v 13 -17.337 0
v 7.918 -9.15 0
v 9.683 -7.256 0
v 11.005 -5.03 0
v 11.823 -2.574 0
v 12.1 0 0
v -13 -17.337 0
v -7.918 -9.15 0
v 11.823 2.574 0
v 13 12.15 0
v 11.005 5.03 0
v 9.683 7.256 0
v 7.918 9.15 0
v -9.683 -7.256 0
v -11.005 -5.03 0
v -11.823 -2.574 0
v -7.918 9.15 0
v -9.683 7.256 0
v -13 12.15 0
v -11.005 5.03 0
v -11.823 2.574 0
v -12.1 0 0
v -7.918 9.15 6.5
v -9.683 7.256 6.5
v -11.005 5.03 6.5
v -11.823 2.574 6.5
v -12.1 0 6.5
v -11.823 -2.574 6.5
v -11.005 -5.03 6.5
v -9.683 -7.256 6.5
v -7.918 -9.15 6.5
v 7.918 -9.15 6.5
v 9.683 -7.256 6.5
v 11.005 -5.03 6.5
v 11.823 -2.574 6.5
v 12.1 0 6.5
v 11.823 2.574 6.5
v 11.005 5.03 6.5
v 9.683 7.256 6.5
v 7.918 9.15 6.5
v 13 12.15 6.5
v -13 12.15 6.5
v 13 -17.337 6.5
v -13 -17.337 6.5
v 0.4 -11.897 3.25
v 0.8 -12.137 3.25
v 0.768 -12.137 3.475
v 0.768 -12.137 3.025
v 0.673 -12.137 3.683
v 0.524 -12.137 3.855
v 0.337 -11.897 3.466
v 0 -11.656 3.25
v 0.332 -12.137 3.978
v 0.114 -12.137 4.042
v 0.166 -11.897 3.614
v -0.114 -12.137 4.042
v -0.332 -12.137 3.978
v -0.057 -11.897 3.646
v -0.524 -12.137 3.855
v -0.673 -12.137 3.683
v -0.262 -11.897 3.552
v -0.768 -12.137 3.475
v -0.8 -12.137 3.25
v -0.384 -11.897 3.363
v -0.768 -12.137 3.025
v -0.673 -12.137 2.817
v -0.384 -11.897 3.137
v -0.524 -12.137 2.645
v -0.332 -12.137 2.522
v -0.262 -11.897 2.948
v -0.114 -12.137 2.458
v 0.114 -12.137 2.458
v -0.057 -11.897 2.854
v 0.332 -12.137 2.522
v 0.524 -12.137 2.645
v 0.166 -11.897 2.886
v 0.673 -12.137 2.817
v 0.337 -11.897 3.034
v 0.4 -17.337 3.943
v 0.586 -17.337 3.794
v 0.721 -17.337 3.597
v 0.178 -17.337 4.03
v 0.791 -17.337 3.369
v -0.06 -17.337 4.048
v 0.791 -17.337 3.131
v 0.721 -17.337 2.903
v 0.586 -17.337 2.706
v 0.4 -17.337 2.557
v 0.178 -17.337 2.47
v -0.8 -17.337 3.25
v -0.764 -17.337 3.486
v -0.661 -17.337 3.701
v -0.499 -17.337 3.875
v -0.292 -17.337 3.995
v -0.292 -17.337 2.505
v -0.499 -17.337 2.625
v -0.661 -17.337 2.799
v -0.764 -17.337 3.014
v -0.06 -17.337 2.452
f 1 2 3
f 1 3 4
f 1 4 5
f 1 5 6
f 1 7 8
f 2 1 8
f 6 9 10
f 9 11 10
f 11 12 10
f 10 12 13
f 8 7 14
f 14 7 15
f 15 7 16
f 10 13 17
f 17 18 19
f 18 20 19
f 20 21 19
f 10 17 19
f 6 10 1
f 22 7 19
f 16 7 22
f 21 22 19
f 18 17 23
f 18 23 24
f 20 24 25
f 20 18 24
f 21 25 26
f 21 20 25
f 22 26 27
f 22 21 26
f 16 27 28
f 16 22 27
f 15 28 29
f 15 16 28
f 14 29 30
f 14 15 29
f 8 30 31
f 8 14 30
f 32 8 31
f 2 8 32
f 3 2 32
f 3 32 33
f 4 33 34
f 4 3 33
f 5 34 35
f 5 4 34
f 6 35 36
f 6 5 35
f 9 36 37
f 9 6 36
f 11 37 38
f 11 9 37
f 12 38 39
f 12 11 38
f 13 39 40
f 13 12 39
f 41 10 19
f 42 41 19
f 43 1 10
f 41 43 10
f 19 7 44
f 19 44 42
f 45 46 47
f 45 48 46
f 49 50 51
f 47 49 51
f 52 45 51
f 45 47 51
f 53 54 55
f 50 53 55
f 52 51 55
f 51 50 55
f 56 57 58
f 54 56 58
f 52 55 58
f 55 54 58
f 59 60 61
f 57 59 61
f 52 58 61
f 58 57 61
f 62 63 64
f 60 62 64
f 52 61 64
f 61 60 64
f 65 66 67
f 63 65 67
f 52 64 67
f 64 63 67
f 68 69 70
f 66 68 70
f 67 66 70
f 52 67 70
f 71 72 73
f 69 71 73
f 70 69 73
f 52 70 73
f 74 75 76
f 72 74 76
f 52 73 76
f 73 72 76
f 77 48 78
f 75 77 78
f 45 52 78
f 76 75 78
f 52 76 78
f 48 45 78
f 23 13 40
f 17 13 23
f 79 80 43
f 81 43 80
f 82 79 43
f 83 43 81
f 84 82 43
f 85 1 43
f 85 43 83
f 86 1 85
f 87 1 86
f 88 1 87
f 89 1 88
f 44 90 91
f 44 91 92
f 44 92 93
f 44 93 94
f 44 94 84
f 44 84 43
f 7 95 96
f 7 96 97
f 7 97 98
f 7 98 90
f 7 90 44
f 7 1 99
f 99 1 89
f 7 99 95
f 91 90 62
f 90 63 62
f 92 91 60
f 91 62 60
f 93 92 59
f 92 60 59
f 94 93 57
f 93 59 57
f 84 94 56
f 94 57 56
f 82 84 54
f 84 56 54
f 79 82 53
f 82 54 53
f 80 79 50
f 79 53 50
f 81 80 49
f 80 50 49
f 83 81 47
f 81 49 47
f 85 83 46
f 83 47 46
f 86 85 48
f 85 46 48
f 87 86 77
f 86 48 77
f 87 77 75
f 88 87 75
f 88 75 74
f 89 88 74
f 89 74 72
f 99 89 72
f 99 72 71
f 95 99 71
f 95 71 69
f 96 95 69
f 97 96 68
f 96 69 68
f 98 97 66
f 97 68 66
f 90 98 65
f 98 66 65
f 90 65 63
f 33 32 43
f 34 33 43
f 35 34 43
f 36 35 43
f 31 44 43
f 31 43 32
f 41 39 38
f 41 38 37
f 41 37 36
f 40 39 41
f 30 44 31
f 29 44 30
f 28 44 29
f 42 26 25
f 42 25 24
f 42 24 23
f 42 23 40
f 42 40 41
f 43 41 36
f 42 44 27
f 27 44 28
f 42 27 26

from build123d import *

# Parameters (mm, degrees)
SKETCH2_W                 = 29.487
SKETCH2_H                 = 26
BOSS_EXTRUDE1_DEPTH       = 6.5
CUT_EXTRUDE1_DEPTH        = 23.623473849
M2X0_4_TAPPED_HOLE1_D     = 1.6
M2X0_4_TAPPED_HOLE1_DEPTH = 5.2
M2X0_4_TAPPED_HOLE1_TIP   = 0.480688495


with BuildPart() as part:
    # Sketch2 → Boss-Extrude1 (new body)
    with BuildSketch(Plane(origin=(0, 0, 0), x_dir=(0, 1, 0), z_dir=(0, 0, 1))):
        with Locations((-2.5935, 0)):
            Rectangle(SKETCH2_W, SKETCH2_H)
    extrude(amount=BOSS_EXTRUDE1_DEPTH)

    # Sketch1 → Cut-Extrude1 (cut, through all)
    with BuildSketch(Plane(origin=(0, 0, 0), x_dir=(0, 1, 0), z_dir=(0, 0, 1))):
        with BuildLine():
            Line((-9.15, 7.917543811), (-9.15, -7.917543811))
            ThreePointArc((-9.15, -7.917543811), (0, -12.1), (9.15, -7.917543811))
            Line((9.15, -7.917543811), (9.15, 7.917543811))
            ThreePointArc((9.15, 7.917543811), (0, 12.1), (-9.15, 7.917543811))
        make_face()
    extrude(amount=CUT_EXTRUDE1_DEPTH, mode=Mode.SUBTRACT)

    # M2x0.4 Tapped Hole1
    with Locations(Plane.XZ.offset(17.337)):
        with Locations((0, 3.25)):
            Hole(M2X0_4_TAPPED_HOLE1_D / 2, depth=M2X0_4_TAPPED_HOLE1_DEPTH)
            with Locations((0, 0, -(M2X0_4_TAPPED_HOLE1_DEPTH + M2X0_4_TAPPED_HOLE1_TIP / 2))):  # 118° drill point
                Cone(0, M2X0_4_TAPPED_HOLE1_D / 2, M2X0_4_TAPPED_HOLE1_TIP, mode=Mode.SUBTRACT)


solid = part.part
